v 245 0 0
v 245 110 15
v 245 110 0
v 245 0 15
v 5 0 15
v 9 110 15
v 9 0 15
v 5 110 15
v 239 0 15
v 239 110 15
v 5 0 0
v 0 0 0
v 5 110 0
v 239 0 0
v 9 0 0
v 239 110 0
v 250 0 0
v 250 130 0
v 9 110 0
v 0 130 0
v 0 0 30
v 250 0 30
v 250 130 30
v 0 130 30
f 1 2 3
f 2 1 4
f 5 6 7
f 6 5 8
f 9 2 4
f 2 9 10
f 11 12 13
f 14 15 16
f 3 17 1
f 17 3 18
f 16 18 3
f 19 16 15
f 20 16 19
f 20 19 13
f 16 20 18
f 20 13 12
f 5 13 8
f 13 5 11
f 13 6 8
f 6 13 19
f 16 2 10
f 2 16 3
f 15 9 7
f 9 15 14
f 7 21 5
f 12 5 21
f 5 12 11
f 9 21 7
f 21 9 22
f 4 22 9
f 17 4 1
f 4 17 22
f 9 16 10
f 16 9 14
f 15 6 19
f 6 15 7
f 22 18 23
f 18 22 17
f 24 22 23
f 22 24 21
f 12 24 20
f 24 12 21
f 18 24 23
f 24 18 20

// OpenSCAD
module main(){
difference()
{   
    cube([250,130,30]);
    //translate([15,5,5])cube([220,120,25]);
    //top_hole();
    bottom_slits();


}

}


module bottom_slits()
{
    difference()
    {
        translate([5,0,0])cube([240,110,15]);
        translate([9,0,0])cube([230,110,15]);
    }
}

module top_hole()
{
    
    points = [
    [10,5,30],
    [240,5,30],
    [240,125,30],
    [10,125,30],
    [30,5,5],
    [240,5,5],
    [240,125,5],
    [30,125,5]
    ];
    faces=[
    [0,1,2,3],
    [4,5,6,7],
    [0,1,5,4],
    [2,3,7,6],
    [0,3,7,4],
    [1,2,6,5]
    ];
    polyhedron(points,faces,10);
    
    
}

main();
